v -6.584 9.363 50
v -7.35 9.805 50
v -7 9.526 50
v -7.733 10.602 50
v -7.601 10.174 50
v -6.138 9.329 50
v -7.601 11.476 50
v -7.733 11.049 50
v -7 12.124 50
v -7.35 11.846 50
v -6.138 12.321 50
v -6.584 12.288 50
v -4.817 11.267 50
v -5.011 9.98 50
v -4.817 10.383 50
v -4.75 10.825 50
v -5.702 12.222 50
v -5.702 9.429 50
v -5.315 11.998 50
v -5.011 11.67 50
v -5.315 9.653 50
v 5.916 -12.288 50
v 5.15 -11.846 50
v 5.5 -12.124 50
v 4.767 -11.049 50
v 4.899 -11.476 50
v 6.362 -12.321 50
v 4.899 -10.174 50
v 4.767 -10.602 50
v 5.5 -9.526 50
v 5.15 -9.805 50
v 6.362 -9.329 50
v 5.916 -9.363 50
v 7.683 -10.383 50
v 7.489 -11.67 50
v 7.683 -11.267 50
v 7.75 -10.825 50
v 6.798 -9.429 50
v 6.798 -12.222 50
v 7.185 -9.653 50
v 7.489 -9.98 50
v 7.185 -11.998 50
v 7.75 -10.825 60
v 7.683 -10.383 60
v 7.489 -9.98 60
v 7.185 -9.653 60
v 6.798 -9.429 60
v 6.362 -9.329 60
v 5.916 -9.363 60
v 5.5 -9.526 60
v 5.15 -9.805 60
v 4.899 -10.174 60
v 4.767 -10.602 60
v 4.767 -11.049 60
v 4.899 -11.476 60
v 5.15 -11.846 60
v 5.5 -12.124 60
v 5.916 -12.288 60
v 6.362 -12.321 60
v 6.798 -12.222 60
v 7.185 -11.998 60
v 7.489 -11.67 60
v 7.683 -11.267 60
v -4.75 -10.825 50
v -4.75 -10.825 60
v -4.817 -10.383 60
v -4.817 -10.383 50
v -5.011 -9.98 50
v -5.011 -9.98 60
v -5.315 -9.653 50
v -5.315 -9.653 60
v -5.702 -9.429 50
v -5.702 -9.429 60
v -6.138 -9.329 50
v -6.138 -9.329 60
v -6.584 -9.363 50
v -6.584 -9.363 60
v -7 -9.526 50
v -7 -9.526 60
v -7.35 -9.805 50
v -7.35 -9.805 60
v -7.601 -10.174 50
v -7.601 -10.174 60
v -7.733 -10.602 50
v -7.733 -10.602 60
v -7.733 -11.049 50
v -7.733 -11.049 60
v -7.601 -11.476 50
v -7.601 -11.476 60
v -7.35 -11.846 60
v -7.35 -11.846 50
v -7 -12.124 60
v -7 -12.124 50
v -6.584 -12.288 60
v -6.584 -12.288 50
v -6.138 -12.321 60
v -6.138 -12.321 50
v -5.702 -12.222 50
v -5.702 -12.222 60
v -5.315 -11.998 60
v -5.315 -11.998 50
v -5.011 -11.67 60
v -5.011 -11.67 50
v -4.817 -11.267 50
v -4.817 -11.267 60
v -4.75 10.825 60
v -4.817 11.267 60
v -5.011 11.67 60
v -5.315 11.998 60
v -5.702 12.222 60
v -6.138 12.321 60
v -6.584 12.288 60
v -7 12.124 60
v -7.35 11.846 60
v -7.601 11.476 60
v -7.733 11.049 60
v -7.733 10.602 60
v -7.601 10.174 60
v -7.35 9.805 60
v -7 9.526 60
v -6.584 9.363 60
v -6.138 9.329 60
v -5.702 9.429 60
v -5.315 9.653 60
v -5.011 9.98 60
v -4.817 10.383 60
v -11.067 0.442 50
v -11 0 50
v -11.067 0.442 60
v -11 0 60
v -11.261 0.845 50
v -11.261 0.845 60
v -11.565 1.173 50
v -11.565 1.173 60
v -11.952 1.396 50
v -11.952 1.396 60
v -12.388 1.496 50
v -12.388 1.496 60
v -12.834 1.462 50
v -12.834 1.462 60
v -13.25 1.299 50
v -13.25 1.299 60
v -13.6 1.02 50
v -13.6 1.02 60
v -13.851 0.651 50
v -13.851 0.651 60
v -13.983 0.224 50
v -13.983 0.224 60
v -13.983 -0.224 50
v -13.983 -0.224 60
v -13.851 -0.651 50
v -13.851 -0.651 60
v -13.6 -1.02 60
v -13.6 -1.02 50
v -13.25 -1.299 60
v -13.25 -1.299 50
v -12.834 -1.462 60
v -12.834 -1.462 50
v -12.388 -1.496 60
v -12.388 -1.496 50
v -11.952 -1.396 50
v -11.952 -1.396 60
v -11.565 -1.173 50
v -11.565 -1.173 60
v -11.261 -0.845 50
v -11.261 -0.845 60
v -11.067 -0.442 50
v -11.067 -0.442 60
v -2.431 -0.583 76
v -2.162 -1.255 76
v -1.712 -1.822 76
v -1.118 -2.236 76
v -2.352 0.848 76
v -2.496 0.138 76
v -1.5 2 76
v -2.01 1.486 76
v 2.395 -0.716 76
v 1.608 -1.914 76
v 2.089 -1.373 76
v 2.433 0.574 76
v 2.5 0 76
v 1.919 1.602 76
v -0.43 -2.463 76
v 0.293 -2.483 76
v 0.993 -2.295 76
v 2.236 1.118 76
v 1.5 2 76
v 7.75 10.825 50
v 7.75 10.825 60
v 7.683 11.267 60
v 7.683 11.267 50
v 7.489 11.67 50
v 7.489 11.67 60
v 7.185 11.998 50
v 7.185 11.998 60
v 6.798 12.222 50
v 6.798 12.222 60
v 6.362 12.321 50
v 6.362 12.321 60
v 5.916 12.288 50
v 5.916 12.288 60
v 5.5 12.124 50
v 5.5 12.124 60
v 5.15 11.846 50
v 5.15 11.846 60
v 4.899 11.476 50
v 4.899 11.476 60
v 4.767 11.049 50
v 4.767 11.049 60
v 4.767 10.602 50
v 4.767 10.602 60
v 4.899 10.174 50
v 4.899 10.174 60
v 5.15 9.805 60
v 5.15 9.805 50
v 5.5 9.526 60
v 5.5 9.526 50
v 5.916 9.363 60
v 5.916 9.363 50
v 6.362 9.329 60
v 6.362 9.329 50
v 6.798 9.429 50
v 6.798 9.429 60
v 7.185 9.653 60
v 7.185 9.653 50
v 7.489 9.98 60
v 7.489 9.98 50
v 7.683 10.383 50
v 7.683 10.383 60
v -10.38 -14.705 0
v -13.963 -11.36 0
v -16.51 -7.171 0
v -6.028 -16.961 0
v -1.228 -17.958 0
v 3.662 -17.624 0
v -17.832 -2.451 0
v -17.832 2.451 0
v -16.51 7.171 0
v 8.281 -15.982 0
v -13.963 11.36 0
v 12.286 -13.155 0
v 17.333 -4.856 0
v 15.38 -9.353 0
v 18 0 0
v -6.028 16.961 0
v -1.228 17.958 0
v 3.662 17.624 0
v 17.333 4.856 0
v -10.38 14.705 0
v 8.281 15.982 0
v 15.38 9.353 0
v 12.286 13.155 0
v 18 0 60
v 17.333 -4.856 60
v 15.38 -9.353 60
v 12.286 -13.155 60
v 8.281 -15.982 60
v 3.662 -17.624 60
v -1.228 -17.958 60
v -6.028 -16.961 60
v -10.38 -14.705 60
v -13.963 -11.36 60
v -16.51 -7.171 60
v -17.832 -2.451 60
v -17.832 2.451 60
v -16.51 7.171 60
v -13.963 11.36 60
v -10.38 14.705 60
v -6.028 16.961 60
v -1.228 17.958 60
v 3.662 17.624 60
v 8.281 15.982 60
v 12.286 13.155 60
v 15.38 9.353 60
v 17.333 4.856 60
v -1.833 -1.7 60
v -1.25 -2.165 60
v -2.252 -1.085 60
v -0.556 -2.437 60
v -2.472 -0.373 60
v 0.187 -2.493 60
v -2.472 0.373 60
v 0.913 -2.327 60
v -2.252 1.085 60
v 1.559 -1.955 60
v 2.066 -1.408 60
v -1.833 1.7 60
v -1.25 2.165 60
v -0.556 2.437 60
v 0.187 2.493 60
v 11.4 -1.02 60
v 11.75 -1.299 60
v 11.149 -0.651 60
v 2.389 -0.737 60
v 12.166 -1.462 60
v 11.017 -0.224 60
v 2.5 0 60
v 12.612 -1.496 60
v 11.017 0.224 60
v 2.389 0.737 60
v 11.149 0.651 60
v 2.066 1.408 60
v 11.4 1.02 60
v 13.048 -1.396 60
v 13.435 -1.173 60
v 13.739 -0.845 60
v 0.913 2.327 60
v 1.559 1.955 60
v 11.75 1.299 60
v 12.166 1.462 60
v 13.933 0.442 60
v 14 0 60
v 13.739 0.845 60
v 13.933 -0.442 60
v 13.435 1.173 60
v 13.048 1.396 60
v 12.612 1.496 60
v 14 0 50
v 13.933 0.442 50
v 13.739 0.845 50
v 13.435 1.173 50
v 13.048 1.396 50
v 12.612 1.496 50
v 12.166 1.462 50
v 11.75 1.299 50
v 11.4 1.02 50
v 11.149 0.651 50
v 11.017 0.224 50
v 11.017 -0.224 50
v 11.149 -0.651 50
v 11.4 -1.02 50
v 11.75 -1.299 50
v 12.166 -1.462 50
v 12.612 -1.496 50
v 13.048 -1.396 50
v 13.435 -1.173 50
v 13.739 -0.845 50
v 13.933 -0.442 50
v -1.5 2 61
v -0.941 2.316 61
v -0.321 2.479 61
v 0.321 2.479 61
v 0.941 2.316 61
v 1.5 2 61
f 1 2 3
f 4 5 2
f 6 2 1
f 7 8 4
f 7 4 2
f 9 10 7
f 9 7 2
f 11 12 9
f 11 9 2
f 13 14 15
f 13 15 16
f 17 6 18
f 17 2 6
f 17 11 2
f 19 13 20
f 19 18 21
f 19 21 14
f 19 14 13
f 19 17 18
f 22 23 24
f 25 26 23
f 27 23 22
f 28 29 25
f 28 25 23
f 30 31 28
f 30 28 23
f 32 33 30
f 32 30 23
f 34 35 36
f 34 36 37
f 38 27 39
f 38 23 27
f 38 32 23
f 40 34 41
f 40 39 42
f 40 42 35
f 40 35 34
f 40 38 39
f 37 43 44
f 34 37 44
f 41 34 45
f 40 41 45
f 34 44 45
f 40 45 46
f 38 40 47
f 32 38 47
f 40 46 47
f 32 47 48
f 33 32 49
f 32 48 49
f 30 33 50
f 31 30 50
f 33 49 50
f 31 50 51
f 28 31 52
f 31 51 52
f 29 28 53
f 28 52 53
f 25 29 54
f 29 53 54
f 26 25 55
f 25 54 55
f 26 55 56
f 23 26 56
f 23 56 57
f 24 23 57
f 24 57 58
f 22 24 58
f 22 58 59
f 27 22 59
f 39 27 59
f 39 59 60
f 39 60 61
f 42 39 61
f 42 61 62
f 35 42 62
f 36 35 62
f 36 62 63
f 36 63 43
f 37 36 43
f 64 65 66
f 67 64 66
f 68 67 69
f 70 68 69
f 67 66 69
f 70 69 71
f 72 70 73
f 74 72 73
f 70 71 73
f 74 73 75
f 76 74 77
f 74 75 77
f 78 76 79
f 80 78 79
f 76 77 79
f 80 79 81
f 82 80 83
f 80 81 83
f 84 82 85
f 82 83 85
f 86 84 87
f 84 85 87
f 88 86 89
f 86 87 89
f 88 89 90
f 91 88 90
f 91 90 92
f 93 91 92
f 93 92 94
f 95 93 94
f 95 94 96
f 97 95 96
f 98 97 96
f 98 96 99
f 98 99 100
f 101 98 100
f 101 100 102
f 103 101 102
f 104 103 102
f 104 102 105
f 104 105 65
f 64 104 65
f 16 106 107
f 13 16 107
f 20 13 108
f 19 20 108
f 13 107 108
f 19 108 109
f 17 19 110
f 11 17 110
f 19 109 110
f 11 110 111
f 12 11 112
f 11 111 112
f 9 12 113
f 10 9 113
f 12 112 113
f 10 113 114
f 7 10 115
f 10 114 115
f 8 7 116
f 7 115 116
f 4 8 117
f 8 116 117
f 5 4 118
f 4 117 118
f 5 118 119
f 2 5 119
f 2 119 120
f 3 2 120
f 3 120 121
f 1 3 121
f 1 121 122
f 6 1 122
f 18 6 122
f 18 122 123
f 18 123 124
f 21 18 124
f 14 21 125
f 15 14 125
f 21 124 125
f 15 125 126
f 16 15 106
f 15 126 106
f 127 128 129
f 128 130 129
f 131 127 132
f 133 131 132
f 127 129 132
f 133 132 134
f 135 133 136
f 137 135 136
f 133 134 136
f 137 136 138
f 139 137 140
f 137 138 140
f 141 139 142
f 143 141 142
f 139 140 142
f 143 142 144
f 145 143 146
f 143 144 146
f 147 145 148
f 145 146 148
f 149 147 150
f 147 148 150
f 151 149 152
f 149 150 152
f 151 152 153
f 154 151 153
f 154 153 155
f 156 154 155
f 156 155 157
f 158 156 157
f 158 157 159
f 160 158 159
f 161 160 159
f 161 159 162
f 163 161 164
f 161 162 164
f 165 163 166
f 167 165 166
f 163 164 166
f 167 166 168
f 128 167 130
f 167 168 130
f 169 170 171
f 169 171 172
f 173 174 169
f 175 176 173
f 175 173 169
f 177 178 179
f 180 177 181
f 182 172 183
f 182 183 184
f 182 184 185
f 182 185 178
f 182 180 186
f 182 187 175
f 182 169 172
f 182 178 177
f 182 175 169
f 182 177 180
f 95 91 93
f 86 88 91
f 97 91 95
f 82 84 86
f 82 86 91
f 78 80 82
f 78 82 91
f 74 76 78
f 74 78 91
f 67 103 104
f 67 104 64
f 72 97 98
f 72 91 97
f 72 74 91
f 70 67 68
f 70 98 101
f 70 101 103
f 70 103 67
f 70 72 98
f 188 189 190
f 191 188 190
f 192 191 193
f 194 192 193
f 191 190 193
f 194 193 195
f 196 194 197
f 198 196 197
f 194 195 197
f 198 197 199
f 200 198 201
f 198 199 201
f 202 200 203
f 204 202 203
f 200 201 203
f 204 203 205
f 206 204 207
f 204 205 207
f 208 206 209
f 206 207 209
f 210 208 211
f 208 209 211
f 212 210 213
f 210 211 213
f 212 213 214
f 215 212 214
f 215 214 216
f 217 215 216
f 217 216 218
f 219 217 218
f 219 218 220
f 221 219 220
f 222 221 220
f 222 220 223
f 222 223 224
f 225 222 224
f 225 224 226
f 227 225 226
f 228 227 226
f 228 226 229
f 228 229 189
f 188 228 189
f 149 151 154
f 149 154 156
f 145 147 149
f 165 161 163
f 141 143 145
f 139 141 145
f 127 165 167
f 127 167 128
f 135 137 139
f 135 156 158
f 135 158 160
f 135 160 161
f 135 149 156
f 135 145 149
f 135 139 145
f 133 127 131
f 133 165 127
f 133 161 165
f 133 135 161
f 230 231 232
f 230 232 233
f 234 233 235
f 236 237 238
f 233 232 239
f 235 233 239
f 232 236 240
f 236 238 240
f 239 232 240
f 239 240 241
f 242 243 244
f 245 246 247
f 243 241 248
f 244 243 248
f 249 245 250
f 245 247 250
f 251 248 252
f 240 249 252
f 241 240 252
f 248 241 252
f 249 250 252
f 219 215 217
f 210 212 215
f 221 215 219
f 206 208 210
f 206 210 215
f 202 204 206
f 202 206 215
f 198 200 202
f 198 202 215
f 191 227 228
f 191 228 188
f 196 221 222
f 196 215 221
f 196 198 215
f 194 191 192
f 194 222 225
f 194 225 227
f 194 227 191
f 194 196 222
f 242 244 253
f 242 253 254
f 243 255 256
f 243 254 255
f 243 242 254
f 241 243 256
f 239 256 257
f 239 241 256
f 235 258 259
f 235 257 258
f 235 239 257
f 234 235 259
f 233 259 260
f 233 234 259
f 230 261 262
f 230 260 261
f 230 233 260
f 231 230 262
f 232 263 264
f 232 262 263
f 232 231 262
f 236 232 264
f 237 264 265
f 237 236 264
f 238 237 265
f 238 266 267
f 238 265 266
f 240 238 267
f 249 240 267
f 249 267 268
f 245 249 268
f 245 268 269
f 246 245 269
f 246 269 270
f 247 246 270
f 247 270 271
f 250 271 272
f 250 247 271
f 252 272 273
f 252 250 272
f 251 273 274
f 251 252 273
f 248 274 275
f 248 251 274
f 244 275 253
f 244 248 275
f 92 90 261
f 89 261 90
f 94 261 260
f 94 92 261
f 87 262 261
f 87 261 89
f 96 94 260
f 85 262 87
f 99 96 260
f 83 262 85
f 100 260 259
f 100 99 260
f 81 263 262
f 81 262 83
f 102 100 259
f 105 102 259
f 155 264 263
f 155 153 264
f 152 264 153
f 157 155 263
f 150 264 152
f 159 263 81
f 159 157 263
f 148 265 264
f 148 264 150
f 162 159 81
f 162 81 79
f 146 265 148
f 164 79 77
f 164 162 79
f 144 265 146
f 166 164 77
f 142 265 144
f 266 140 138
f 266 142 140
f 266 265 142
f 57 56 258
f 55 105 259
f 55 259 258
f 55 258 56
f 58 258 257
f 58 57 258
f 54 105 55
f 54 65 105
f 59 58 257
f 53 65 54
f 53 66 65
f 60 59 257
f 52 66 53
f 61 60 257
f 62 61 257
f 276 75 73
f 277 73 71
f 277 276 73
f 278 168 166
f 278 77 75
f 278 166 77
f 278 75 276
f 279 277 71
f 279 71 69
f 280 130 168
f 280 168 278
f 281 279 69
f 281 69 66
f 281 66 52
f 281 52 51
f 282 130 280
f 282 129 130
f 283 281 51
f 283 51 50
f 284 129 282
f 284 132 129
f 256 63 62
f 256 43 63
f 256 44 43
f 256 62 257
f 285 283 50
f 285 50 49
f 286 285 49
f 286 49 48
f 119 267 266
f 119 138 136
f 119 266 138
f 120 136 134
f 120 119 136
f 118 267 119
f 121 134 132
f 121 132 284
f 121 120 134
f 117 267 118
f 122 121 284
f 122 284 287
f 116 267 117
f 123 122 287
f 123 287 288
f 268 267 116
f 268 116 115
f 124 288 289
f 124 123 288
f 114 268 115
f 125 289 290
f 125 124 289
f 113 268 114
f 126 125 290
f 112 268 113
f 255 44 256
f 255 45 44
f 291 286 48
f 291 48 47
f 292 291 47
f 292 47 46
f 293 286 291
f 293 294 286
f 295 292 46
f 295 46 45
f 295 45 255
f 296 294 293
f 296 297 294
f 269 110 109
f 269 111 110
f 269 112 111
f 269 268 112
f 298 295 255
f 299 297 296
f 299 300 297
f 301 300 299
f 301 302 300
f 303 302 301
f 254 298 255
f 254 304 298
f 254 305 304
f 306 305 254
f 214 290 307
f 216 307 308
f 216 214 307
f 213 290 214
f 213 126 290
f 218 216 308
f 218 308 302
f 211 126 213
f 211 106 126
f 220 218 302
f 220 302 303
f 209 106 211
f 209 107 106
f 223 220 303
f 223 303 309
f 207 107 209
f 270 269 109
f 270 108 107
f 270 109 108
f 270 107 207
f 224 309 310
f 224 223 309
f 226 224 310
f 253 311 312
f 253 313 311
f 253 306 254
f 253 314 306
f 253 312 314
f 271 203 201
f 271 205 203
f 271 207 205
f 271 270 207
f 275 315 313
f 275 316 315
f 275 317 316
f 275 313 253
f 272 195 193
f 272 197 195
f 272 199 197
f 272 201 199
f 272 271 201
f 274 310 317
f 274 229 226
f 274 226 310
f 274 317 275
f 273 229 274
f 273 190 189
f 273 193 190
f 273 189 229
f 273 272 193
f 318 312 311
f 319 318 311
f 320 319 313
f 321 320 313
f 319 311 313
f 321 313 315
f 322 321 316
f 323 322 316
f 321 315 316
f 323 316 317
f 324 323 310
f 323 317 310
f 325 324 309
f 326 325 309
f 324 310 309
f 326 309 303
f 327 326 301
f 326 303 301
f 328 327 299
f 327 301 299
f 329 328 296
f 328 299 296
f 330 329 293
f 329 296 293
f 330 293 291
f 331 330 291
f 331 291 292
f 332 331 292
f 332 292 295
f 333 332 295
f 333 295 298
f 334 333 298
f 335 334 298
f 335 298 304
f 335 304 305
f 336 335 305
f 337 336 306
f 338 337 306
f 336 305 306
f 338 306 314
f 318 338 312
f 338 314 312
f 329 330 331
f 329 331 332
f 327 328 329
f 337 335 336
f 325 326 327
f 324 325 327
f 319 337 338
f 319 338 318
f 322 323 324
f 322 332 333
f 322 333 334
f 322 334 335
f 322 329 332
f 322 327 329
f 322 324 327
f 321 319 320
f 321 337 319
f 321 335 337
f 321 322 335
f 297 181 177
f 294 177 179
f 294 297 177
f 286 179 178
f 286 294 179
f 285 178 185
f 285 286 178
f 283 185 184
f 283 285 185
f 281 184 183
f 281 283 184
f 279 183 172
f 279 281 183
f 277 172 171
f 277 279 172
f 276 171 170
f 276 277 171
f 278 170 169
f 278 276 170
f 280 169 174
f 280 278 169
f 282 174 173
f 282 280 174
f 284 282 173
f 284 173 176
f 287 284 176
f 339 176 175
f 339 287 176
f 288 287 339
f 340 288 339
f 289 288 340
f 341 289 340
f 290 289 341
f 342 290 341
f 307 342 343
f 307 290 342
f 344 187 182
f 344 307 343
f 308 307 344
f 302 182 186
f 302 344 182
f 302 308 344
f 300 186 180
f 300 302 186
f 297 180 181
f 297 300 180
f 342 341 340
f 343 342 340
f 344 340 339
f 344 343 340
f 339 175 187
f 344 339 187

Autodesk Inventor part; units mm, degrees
ref_plane "YZ Plane" through (0, 0, 0) normal (1, 0, 0) x (0, 1, 0)
ref_plane "XZ Plane" through (0, 0, 0) normal (0, 1, 0) x (-1, 0, 0)
ref_plane "XY Plane" through (0, 0, 0) normal (0, 0, 1) x (1, 0, 0)
sketch "Sketch1" plane through (0, 0, 0) normal (0, 0, 1) x (1, 0, 0)
  circle A0 centre (0, 0) radius 18
  dimension "d0" = 36
extrude "Extrusion1" add sketch "Sketch1" along normal blind 60
sketch "Sketch2" plane through (0, 0, 60) normal (0, 0, 1) x (1, 0, 0)
  circle A0 centre (0, 0) radius 2.5
  dimension "d3" = 5
extrude "Extrusion2" add sketch "Sketch2" along normal blind 16
sketch "Sketch3" plane through (0, 0, 76) normal (0, 0, 1) x (1, 0, 0)
  circle A0 centre (0, 0) radius 2.5 projected
  line L0 (-1.5, 2) -> (1.5, 2)
  dimension "d6" = 4.5
extrude "Extrusion3" cut sketch "Sketch3" against normal blind 15 contours L0 A0 picked at (-0.3466, 2.0912)
sketch "Sketch4" plane through (0, 0, 60) normal (0, 0, 1) x (1, 0, 0)
  circle A0 centre (-12.5, 0) radius 1.5
  circle A1 centre (0, 0) radius 18 projected
  circle A2 centre (-6.25, -10.8253) radius 1.5
  circle A3 centre (6.25, -10.8253) radius 1.5
  circle A4 centre (12.5, 0) radius 1.5
  circle A5 centre (6.25, 10.8253) radius 1.5
  circle A6 centre (-6.25, 10.8253) radius 1.5
  dimension "d9" = 3
  dimension "d10" = 12.5
  dimension "d13" = 360
extrude "Extrusion4" cut sketch "Sketch4" against normal blind 10 contours A0 | A2 | A3 | A4 | A5 | A6
properties part number "silnik 3660"
